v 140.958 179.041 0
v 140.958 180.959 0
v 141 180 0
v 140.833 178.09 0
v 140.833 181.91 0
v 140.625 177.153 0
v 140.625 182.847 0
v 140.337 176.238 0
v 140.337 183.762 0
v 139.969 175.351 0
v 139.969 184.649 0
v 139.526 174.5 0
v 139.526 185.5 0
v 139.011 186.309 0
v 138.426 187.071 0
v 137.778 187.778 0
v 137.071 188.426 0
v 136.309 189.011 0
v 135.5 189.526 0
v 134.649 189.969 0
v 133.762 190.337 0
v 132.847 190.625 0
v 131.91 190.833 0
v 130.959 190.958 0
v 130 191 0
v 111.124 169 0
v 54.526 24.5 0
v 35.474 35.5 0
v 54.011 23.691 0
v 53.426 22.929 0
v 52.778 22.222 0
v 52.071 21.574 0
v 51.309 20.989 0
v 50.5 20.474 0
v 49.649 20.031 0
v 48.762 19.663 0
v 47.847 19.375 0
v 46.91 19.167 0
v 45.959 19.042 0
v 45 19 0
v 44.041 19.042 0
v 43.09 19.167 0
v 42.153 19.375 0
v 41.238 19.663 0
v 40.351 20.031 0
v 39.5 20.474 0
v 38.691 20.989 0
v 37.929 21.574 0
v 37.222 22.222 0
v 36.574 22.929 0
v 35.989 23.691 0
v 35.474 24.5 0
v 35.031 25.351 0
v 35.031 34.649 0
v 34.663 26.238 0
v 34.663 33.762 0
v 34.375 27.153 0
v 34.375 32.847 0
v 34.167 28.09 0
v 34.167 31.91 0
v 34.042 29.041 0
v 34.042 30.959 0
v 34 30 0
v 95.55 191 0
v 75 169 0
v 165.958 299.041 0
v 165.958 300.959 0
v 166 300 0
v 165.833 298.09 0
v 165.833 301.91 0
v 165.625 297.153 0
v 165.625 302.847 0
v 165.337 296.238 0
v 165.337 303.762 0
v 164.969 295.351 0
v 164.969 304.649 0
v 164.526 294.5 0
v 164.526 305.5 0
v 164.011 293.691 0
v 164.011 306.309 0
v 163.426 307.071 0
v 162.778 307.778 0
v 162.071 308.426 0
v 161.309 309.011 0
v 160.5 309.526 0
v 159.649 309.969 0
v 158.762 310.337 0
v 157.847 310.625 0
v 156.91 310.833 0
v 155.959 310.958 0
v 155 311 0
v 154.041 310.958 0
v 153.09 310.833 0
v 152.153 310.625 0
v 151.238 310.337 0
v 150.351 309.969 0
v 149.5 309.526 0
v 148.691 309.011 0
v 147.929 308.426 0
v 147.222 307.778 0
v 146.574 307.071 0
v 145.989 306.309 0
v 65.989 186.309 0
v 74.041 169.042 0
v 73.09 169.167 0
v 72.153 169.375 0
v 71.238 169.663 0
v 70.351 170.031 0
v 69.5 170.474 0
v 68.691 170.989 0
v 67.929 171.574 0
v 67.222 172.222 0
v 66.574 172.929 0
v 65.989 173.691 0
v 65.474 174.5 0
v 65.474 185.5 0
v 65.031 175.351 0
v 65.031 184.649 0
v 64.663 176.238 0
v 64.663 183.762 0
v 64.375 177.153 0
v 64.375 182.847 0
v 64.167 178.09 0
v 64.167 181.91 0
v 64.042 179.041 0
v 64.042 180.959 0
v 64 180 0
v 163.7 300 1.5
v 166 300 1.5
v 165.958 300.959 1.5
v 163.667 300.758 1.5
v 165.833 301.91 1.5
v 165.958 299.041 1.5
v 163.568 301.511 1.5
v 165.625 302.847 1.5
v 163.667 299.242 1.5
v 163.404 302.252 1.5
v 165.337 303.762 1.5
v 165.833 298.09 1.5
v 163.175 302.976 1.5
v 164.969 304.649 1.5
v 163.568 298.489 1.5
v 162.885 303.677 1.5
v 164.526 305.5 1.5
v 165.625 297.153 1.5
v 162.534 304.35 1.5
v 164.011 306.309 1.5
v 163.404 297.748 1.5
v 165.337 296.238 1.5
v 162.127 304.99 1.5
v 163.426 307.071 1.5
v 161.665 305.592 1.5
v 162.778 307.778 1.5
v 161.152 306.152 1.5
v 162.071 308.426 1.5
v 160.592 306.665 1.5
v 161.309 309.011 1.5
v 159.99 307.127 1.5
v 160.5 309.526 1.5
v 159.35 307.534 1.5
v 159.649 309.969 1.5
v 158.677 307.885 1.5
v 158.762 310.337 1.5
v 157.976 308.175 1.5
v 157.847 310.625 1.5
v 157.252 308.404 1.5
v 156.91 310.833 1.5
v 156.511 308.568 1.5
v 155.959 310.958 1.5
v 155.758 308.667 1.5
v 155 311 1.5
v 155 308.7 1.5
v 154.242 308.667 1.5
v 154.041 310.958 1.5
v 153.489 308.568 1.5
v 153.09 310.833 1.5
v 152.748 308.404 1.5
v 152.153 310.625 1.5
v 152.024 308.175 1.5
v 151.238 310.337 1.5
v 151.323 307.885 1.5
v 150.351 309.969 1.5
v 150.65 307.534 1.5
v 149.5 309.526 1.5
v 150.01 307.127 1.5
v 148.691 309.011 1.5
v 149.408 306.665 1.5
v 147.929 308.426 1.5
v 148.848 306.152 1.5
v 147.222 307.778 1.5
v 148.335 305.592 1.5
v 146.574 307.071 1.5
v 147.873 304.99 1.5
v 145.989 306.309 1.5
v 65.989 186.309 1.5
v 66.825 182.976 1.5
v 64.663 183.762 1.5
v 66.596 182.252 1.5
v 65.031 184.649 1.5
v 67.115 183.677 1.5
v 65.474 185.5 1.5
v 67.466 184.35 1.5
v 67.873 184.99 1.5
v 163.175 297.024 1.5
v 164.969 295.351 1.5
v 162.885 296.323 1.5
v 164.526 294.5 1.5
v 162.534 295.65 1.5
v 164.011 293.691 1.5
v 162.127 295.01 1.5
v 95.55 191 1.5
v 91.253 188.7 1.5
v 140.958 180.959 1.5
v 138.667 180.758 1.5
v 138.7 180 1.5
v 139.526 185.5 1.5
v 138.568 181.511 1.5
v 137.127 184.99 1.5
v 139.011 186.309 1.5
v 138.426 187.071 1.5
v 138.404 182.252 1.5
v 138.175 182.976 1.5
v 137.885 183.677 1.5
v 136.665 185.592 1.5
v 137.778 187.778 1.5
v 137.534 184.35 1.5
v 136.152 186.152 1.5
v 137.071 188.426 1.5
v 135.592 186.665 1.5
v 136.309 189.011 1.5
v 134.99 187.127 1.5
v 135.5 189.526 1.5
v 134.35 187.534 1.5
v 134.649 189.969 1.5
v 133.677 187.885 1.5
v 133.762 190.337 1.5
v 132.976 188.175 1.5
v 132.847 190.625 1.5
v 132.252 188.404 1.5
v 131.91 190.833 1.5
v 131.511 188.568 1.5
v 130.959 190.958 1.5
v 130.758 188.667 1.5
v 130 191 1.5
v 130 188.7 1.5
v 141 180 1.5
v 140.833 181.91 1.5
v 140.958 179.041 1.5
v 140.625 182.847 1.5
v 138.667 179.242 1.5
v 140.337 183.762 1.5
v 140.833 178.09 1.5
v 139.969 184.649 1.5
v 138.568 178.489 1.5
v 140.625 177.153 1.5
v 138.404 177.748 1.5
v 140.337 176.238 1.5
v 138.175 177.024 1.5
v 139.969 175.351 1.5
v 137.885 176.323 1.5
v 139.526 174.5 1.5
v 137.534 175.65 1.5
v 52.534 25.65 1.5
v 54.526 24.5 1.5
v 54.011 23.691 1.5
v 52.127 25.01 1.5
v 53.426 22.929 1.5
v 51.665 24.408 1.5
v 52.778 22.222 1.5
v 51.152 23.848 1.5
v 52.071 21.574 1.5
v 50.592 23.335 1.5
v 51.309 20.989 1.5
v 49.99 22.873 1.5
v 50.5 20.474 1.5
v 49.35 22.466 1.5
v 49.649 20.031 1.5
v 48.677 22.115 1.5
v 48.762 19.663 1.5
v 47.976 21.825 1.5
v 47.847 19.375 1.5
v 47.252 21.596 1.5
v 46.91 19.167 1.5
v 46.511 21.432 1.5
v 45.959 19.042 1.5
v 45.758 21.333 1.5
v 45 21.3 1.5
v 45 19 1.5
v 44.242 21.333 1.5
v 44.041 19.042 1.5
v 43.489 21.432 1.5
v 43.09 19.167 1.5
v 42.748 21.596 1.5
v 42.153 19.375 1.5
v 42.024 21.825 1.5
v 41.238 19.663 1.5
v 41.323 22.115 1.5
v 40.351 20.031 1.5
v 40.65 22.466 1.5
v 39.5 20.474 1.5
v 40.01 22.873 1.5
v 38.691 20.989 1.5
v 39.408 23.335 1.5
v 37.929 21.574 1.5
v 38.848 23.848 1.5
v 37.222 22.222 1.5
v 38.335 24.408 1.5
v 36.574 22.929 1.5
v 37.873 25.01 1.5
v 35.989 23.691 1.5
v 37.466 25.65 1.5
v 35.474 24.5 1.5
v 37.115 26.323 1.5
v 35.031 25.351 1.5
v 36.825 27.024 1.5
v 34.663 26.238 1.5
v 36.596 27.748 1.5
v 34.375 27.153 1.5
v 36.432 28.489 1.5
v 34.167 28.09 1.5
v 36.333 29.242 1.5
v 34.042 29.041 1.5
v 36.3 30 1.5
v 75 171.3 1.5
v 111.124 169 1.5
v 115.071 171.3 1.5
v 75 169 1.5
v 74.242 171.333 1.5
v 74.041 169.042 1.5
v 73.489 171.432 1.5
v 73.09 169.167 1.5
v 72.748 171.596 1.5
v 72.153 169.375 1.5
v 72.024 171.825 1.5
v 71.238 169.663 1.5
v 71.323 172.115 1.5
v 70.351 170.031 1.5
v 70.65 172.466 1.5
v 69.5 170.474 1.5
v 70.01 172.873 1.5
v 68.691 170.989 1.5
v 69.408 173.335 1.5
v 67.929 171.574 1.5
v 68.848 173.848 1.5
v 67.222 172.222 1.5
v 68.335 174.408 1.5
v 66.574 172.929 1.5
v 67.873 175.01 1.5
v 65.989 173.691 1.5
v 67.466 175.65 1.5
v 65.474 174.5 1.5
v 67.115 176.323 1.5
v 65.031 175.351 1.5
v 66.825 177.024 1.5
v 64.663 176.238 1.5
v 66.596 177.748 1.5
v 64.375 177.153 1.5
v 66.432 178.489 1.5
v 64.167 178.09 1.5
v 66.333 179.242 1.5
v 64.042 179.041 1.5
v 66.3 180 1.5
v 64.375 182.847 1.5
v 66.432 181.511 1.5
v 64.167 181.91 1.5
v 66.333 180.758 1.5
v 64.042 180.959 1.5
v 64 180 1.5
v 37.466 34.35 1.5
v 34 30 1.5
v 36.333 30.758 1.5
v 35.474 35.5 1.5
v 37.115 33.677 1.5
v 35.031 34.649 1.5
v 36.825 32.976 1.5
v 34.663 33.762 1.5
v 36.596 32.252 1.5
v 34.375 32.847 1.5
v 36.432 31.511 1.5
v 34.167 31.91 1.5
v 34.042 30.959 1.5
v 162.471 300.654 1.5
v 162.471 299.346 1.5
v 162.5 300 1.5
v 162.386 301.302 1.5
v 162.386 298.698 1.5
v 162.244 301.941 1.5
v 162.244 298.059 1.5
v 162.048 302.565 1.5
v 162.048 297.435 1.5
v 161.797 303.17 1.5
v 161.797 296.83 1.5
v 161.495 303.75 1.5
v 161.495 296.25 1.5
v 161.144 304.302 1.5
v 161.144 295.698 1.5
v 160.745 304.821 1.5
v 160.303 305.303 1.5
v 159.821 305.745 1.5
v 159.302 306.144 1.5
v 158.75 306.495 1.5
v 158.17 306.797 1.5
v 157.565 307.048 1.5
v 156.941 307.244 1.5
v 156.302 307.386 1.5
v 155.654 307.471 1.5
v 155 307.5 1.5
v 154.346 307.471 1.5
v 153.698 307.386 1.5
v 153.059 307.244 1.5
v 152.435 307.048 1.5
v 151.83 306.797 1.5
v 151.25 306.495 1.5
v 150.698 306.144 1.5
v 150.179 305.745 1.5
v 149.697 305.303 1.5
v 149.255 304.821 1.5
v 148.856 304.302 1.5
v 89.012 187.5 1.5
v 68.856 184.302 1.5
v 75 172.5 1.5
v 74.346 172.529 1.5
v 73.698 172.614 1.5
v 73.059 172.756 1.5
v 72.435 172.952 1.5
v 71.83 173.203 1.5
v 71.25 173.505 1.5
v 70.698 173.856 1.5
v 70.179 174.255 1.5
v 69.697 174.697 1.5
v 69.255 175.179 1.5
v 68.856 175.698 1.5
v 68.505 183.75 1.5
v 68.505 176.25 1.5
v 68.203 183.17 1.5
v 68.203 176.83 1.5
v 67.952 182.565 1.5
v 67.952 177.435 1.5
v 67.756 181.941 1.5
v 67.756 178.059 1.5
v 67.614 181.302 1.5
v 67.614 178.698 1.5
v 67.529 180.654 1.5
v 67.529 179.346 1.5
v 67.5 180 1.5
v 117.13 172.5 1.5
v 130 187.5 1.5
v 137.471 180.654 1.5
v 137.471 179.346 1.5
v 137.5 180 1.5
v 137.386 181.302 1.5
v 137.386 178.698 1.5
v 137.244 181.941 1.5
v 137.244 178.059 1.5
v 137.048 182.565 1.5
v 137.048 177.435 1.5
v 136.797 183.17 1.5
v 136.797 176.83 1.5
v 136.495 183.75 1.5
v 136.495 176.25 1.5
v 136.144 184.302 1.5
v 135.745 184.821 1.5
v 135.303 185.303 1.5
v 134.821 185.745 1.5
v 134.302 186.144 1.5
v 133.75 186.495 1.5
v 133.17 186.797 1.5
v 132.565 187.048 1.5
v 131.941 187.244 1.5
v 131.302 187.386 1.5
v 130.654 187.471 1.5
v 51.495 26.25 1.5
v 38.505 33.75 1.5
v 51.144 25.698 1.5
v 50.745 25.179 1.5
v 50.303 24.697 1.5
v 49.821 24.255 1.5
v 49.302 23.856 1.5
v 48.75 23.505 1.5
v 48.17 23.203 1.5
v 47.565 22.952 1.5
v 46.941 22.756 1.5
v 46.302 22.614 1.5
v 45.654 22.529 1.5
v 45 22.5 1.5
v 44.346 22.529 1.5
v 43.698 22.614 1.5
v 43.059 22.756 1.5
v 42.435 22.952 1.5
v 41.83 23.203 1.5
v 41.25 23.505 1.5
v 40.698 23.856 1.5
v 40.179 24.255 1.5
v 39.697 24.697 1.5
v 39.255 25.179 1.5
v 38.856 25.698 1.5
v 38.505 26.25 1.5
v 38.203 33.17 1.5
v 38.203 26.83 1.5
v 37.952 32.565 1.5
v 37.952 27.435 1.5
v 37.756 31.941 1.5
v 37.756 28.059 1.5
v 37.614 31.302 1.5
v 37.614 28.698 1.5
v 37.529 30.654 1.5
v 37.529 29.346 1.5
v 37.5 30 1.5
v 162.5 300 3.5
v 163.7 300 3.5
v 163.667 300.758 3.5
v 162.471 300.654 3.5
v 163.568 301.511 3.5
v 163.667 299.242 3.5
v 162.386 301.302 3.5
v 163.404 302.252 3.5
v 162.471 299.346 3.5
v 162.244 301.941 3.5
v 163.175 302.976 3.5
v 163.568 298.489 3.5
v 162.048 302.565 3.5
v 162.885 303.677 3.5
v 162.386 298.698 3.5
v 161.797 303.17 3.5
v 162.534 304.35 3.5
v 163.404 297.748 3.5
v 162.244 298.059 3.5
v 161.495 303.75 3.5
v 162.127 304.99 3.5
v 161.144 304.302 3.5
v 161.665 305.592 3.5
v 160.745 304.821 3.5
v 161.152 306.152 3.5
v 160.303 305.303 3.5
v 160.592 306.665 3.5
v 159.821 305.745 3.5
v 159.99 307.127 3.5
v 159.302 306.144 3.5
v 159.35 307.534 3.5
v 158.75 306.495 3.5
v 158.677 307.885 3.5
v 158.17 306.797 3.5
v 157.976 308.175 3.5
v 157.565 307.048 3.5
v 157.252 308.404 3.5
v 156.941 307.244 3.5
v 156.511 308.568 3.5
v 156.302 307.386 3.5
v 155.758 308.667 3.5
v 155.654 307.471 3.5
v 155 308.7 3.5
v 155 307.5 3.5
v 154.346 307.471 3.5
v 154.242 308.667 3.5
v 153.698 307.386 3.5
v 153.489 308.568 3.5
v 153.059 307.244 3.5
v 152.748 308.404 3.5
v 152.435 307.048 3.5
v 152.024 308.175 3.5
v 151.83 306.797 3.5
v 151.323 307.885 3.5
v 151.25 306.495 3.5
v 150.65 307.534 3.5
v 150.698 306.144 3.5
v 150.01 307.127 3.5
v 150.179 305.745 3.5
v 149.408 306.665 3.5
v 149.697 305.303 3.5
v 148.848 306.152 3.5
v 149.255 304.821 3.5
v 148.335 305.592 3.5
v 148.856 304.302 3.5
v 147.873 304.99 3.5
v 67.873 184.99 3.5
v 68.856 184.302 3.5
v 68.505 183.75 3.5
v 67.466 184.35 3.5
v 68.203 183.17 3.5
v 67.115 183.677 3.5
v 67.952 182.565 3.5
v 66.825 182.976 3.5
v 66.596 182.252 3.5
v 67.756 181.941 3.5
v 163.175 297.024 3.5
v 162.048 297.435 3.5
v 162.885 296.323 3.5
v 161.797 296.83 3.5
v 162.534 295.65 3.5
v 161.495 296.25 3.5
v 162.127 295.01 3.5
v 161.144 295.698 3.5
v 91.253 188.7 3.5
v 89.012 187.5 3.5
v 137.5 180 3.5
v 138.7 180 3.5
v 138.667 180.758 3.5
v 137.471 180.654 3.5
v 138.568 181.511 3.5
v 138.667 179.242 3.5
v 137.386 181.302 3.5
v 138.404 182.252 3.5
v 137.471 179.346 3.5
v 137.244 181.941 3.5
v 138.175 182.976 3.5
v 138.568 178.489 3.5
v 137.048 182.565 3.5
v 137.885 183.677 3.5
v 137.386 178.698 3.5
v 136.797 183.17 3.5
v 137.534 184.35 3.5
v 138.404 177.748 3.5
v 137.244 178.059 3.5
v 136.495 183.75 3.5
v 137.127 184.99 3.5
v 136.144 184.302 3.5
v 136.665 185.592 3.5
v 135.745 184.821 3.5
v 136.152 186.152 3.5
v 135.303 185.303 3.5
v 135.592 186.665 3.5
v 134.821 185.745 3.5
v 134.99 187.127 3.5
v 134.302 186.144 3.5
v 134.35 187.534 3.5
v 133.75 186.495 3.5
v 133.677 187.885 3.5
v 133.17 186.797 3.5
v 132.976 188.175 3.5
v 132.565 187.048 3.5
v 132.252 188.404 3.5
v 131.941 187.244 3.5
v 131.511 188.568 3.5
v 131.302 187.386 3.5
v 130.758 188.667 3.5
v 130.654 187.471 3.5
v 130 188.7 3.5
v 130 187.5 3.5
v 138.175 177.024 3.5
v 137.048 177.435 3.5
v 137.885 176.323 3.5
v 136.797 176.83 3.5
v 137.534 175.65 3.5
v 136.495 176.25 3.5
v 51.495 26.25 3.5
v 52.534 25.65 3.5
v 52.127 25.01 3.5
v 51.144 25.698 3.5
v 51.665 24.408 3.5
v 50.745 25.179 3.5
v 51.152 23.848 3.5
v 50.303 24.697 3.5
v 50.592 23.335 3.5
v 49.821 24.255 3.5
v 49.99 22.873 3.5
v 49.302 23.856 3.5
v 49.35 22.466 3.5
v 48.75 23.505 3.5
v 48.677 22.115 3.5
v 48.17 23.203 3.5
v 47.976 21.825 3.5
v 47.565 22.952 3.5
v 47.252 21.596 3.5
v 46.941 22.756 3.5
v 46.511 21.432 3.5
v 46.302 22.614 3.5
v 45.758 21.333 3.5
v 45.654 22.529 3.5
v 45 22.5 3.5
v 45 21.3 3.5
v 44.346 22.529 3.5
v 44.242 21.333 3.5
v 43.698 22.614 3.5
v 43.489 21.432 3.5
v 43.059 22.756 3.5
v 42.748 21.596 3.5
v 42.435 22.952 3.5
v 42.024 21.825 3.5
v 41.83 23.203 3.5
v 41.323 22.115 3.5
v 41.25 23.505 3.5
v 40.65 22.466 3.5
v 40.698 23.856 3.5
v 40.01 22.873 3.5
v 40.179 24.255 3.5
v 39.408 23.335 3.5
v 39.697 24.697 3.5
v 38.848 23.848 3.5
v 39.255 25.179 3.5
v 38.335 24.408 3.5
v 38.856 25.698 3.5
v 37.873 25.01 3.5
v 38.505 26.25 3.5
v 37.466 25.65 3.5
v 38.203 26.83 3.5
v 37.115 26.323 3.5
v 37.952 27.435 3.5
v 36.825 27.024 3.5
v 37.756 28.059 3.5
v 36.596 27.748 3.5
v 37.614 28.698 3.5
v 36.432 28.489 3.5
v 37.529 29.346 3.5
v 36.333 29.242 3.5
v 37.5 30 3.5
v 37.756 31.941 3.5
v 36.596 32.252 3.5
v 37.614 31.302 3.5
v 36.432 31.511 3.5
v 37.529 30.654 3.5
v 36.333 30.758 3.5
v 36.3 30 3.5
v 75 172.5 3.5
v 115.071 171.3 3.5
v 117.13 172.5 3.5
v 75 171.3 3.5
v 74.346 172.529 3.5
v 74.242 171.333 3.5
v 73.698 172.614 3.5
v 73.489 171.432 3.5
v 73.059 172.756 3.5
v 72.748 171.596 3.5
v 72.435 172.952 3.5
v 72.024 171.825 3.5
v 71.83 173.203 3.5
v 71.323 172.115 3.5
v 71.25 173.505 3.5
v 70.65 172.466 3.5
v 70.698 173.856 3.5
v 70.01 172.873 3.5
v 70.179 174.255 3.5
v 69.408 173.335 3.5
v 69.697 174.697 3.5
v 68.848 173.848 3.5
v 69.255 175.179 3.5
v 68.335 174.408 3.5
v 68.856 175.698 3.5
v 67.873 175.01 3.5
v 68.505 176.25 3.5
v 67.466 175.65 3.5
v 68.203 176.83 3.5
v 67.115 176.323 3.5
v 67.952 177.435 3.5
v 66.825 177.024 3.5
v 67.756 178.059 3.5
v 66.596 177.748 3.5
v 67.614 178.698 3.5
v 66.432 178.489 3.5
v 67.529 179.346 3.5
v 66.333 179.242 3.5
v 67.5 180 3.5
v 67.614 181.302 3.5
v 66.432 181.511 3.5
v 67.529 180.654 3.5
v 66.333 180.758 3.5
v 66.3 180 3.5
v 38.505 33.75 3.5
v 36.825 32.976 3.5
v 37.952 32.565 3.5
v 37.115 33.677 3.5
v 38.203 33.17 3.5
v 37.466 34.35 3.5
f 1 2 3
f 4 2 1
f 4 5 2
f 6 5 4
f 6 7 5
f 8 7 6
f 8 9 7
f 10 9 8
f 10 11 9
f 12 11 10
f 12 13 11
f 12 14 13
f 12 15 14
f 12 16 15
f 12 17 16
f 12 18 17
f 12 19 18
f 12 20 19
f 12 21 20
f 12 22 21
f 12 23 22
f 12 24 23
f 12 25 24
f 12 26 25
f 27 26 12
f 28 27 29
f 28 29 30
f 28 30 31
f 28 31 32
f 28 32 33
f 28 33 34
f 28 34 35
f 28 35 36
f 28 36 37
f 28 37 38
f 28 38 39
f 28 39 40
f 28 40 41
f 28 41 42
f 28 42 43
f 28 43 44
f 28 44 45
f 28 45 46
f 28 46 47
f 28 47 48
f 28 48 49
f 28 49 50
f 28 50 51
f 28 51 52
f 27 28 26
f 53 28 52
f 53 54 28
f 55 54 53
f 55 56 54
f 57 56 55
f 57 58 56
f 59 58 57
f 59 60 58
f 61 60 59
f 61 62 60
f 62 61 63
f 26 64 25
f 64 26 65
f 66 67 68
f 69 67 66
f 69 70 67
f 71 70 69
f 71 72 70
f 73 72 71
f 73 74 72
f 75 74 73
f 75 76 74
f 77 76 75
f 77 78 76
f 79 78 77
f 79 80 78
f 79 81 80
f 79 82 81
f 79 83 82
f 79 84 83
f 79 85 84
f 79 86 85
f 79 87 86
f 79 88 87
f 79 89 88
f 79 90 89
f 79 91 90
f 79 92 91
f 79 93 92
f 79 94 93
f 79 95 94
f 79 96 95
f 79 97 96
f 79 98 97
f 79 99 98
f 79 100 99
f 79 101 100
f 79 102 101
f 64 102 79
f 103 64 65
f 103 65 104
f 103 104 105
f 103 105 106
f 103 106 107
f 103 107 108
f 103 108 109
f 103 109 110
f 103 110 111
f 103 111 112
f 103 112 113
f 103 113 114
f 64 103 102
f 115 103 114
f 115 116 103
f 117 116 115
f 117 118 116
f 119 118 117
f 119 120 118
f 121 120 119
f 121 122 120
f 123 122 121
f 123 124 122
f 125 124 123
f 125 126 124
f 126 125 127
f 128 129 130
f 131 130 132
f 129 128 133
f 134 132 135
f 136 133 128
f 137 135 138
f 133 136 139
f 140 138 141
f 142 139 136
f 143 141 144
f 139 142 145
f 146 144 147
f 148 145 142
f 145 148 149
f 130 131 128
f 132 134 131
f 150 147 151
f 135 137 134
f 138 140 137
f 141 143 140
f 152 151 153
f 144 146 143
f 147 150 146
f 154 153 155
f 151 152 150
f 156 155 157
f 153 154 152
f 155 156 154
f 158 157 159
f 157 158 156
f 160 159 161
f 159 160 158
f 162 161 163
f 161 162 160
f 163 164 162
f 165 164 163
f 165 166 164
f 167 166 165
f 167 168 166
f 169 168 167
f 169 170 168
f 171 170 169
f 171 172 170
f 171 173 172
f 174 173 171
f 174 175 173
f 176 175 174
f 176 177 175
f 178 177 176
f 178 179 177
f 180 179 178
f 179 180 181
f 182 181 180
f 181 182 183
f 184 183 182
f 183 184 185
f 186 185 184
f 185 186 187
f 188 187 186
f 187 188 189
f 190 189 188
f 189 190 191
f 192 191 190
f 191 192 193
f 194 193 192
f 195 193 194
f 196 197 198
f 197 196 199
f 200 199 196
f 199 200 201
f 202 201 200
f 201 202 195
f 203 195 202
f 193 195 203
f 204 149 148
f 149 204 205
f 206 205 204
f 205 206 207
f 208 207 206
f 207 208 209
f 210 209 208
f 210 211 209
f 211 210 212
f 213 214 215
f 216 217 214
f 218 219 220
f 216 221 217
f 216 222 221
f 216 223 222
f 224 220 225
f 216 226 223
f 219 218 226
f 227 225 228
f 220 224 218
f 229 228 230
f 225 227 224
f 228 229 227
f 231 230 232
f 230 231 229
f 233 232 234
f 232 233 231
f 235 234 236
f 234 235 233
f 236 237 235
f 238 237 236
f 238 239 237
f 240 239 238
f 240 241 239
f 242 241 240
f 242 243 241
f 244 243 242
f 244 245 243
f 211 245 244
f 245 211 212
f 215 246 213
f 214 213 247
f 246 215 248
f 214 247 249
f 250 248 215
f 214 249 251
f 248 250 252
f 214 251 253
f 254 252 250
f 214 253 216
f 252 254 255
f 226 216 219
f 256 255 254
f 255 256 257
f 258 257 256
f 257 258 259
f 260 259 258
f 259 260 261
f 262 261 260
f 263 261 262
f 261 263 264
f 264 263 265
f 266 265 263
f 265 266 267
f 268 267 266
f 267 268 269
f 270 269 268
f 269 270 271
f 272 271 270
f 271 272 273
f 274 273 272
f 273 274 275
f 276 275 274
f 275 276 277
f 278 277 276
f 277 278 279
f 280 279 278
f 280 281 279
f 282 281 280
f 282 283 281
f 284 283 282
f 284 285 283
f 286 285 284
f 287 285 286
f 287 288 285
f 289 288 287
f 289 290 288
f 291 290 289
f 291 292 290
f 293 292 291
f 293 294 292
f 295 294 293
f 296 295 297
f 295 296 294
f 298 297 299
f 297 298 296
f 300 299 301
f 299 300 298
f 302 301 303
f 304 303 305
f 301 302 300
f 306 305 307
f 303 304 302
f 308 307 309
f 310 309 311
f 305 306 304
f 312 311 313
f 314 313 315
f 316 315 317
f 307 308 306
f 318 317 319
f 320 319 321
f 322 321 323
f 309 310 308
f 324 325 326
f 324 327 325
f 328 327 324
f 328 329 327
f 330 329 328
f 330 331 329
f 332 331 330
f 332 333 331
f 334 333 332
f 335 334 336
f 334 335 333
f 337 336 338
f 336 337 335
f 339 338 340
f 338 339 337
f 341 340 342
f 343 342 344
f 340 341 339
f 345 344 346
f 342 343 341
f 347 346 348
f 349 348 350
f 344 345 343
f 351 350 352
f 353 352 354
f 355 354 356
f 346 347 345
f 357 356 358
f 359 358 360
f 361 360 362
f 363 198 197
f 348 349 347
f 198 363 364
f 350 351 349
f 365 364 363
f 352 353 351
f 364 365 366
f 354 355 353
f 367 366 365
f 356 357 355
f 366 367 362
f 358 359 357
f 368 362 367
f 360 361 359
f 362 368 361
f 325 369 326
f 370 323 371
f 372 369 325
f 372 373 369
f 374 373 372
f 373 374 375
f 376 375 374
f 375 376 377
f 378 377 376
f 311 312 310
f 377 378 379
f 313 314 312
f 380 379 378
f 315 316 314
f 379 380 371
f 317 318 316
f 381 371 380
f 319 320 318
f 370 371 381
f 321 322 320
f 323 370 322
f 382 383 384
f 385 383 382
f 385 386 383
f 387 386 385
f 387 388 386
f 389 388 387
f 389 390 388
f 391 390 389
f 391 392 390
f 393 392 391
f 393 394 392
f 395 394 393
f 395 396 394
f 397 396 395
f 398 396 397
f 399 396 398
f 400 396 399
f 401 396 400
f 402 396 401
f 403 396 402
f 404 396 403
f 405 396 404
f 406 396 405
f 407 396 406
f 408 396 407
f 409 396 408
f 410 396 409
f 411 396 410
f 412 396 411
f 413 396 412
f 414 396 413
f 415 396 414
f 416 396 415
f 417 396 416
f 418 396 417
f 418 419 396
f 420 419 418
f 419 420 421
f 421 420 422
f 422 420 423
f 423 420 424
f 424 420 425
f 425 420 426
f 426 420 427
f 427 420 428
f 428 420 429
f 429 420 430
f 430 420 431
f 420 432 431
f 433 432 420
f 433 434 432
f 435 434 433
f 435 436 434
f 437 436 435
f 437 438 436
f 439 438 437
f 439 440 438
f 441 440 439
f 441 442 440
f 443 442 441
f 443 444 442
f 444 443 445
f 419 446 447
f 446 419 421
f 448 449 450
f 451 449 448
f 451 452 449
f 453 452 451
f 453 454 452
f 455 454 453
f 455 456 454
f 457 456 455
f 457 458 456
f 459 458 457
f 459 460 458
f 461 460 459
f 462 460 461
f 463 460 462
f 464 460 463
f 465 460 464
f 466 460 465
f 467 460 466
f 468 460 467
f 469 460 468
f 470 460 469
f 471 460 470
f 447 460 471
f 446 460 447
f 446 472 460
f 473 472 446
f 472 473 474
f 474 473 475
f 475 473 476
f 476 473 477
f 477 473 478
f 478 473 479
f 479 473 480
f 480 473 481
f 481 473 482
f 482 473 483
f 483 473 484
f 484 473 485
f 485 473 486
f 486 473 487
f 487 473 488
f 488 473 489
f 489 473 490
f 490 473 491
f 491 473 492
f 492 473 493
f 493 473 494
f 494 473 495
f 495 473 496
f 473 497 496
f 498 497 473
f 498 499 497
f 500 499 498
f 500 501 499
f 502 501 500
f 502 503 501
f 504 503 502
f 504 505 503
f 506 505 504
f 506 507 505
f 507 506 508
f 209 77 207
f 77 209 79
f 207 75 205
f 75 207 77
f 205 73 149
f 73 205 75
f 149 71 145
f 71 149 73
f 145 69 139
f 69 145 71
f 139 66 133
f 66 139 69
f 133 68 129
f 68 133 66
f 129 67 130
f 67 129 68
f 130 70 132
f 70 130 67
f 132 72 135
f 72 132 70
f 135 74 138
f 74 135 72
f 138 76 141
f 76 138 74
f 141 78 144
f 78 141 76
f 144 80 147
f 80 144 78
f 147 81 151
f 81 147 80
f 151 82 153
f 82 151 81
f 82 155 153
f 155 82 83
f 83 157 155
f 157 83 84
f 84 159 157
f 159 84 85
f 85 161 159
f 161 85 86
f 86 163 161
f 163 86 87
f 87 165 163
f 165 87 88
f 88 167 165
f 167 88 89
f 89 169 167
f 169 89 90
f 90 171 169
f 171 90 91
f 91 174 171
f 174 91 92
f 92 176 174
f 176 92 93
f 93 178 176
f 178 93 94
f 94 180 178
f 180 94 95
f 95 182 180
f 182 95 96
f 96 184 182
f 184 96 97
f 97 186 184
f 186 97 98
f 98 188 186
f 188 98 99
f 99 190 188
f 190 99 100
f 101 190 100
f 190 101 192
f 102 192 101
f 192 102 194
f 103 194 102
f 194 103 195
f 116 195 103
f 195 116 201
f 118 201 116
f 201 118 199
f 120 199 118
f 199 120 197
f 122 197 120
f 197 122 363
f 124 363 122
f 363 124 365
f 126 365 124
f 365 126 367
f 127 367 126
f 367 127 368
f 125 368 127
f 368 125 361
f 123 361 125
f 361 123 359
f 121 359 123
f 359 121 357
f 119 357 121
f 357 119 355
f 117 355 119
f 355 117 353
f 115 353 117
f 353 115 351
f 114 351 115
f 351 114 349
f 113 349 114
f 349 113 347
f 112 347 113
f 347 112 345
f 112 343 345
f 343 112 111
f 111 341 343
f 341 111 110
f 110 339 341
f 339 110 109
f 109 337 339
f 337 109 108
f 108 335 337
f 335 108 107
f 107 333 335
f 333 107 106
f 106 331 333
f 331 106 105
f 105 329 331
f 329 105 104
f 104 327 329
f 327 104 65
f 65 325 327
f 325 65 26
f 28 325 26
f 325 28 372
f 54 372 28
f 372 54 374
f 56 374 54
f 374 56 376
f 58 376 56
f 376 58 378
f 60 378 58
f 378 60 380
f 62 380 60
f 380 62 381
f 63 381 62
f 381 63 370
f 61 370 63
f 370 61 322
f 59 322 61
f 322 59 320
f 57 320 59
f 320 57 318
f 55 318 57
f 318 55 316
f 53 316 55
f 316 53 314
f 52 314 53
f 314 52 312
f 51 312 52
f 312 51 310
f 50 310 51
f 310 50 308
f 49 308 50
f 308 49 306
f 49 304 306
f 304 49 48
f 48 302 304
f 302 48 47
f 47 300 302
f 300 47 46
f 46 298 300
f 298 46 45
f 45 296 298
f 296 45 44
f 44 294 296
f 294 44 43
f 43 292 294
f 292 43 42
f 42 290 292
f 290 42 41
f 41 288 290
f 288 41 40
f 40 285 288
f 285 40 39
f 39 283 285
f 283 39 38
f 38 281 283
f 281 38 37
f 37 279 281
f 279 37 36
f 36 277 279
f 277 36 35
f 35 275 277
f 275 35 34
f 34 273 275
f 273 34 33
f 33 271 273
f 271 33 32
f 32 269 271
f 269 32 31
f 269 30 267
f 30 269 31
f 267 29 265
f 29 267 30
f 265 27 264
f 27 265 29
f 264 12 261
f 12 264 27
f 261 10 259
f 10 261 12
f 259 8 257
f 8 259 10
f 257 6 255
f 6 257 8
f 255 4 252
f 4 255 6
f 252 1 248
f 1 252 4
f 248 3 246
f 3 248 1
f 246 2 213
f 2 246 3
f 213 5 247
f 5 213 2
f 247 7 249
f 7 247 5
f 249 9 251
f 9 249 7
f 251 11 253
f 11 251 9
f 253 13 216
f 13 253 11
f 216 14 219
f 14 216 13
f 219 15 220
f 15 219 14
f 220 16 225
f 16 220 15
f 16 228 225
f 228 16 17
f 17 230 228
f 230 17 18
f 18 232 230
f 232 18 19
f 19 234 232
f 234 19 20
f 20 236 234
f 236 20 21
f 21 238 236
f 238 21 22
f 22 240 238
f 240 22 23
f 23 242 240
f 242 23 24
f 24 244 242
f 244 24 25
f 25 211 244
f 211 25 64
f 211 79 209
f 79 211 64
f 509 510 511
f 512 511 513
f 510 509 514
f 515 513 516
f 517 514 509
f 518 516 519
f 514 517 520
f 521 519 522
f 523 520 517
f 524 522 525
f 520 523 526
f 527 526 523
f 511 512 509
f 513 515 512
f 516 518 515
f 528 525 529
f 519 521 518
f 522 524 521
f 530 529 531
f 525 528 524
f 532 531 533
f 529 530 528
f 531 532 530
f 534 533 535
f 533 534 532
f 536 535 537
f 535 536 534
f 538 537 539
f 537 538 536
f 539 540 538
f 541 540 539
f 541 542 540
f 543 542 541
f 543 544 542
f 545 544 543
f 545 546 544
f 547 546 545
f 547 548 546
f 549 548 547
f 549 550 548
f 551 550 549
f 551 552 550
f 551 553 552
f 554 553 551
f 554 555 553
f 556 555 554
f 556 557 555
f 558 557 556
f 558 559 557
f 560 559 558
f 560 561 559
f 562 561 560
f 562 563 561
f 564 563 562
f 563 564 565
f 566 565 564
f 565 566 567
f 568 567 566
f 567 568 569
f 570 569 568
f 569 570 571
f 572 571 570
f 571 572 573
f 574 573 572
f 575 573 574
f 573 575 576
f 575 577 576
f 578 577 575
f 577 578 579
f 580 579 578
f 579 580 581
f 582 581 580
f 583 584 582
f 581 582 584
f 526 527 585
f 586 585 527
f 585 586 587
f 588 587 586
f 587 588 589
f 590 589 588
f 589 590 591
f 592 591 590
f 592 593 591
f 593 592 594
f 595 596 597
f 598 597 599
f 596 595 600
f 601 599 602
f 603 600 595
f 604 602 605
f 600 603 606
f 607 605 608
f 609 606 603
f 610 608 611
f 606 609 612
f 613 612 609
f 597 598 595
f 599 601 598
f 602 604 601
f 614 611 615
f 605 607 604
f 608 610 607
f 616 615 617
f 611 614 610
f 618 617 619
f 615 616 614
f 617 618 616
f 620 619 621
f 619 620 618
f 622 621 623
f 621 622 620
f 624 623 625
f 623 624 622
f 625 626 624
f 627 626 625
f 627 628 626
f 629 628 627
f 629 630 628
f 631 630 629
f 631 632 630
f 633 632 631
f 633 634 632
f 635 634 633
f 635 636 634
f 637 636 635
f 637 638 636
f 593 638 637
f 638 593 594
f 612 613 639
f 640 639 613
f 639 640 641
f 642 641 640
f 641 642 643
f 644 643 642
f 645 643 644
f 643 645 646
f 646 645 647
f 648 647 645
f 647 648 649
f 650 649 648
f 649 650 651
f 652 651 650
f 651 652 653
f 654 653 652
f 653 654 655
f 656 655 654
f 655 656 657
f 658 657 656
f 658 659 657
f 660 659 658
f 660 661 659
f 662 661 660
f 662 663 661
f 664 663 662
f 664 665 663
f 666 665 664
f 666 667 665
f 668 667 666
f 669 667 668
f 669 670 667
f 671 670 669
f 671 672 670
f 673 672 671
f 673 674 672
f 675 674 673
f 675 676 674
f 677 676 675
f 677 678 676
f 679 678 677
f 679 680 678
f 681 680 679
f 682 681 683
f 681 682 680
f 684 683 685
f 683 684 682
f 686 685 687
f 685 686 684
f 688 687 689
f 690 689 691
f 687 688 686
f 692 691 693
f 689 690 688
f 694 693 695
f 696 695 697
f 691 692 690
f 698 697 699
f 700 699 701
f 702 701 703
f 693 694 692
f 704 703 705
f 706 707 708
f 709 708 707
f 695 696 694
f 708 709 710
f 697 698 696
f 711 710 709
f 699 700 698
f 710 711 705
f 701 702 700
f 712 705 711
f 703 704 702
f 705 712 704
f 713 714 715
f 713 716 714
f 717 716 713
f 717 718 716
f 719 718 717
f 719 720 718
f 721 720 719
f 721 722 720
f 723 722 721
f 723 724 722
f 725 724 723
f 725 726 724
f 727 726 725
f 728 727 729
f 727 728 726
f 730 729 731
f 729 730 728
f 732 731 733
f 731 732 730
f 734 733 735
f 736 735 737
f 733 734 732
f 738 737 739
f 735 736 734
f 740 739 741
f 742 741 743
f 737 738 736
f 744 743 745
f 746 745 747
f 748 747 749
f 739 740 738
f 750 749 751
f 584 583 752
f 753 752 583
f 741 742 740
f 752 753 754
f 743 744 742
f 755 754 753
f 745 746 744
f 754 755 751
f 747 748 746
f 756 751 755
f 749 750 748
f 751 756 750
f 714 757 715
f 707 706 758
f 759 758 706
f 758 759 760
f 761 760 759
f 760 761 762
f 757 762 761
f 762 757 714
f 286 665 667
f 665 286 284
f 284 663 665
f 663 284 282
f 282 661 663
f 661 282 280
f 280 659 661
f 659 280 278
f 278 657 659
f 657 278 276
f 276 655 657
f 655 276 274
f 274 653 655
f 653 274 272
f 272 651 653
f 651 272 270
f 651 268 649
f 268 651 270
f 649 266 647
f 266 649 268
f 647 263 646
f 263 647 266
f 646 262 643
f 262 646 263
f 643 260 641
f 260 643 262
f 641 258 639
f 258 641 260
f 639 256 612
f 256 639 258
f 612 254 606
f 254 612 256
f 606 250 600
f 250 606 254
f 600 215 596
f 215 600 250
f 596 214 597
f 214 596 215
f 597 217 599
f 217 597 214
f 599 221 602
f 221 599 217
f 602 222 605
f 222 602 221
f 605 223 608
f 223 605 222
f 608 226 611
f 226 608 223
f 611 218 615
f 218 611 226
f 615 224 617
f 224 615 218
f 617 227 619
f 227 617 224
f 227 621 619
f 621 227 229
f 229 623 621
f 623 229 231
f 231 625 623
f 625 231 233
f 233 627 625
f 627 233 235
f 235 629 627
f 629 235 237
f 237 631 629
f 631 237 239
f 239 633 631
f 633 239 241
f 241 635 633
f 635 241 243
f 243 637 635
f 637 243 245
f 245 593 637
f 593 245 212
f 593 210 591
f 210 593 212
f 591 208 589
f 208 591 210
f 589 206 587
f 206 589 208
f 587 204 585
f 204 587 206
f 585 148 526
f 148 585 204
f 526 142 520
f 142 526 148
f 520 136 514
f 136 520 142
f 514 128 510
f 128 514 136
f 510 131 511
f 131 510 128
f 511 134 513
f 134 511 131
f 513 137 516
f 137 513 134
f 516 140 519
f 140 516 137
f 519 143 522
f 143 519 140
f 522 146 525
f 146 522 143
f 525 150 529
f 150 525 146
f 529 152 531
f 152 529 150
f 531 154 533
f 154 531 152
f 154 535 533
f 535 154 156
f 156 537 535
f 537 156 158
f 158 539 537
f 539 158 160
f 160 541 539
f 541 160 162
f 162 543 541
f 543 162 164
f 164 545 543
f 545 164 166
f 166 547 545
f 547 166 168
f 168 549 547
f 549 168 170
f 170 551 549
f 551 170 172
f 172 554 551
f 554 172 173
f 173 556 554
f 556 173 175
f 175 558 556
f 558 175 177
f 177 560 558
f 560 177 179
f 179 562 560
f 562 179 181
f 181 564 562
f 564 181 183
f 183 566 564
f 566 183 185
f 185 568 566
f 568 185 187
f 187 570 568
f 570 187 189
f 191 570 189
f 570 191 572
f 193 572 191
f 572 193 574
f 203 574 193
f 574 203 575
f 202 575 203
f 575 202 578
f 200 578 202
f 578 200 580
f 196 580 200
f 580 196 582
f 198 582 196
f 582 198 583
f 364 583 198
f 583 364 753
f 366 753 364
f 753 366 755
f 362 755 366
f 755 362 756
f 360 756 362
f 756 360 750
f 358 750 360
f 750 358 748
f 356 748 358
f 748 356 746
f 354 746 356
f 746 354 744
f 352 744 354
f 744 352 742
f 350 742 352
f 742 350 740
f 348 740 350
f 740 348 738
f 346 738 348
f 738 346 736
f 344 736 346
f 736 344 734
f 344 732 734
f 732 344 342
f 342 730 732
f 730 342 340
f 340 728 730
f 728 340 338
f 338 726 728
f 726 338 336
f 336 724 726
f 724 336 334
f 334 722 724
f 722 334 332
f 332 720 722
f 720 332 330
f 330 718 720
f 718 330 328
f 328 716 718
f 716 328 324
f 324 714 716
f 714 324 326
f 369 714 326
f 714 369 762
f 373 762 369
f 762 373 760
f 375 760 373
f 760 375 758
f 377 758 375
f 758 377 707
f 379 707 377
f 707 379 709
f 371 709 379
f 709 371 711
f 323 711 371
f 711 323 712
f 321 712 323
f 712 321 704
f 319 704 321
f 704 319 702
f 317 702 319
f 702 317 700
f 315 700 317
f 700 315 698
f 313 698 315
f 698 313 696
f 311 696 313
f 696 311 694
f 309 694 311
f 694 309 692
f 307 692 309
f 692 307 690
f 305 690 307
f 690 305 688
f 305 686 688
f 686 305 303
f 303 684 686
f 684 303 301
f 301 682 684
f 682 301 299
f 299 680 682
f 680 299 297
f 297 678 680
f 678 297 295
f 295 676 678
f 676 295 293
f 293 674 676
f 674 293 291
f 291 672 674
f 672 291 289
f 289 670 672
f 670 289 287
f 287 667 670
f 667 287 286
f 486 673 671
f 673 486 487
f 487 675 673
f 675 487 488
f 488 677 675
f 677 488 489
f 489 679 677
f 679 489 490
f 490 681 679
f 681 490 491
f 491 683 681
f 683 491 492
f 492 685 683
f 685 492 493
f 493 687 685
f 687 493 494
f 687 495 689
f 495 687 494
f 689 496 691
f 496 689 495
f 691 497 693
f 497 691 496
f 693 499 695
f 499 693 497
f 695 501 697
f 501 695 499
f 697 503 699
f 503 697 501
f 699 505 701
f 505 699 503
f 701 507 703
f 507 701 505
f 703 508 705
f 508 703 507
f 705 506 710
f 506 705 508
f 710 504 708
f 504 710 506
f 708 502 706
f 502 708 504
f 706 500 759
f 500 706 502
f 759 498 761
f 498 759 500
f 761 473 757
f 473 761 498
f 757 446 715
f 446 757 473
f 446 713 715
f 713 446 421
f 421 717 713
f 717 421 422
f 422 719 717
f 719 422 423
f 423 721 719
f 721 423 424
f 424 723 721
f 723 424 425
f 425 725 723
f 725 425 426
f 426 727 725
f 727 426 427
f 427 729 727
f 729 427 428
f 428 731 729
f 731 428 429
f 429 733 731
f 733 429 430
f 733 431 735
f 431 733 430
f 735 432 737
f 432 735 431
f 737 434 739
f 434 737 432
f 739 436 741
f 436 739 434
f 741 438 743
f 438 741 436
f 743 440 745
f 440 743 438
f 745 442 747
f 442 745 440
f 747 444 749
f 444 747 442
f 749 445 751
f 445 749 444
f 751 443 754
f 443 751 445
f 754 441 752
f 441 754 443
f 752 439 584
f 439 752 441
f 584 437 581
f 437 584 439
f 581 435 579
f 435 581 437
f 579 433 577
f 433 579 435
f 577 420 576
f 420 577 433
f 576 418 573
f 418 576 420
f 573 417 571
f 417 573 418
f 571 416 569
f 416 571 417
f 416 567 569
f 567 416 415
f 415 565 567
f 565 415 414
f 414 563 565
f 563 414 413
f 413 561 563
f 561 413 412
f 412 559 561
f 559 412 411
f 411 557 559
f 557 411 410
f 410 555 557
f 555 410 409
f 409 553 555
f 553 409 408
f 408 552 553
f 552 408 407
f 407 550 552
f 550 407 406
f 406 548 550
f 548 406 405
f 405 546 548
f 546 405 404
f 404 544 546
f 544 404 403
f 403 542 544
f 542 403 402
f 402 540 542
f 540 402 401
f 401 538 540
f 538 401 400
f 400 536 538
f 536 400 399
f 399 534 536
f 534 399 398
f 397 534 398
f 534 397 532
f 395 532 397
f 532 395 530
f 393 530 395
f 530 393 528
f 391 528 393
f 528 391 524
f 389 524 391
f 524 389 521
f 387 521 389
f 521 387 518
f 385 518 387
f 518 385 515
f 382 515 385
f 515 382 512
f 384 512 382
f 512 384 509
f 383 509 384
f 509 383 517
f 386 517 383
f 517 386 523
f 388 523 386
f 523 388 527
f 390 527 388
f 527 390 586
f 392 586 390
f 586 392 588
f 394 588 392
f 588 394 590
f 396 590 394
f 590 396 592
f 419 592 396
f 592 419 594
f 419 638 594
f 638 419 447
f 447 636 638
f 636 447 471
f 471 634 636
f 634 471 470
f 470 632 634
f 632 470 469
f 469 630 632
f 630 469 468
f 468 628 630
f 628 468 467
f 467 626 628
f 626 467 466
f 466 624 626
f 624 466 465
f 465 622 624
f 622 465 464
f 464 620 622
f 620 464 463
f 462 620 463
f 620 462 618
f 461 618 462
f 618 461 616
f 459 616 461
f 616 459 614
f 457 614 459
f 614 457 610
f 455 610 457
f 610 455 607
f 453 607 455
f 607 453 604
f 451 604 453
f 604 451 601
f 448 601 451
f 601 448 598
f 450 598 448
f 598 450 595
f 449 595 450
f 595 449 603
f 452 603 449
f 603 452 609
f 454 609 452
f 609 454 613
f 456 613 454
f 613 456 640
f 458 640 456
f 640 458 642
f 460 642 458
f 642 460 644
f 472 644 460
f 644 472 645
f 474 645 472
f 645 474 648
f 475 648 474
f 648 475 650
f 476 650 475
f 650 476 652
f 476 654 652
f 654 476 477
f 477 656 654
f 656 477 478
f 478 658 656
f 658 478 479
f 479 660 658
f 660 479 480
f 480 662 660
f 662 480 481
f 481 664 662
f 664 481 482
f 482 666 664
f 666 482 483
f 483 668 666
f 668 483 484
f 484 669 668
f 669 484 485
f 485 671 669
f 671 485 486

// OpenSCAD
// file: ../bolt.scad
bolt_pts  = [[155.0,300.0], [75.0,180.0], [130.0,180.0], [45.0,30.0]];
pixel_pts = [[155.0,300.0], [142.8,281.7], [130.6,263.3], [118.3,245.0], [106.1,226.7], [93.9,208.3], [81.7,190.0], [96.7,180.0], [118.8,180.0], [119.7,161.9], [108.9,142.8], [98.1,123.6], [87.2,104.5], [76.4,85.3], [65.5,66.2], [54.7,47.1], [45.0,30.0]];

// ===== CHARGE lightning-bolt test piece — option C (~18mm channel) =====
bolt_inner     = 18;                       // channel interior (collar O16 fits)
bolt_wall      = 2;                         // wall thickness
bolt_outer     = bolt_inner + 2*bolt_wall; // 22mm outer stroke
bolt_gap       = 15;                       // LED-tip -> lens
bolt_ch_h      = dome_clear + bolt_gap;    // wall height above plate
bolt_lens_t    = 1.5;                       // lens face thickness
bolt_lip_h     = 2;                         // lens locating lip depth
bolt_lip_clear = 0.6;                       // lip clearance into channel
bolt_lip_t     = 1.2;                       // lip wall thickness

module bolt_stroke(w) {
    for (i = [0 : len(bolt_pts) - 2])
        hull() {
            translate(bolt_pts[i])     circle(d = w);
            translate(bolt_pts[i + 1]) circle(d = w);
        }
}

module bolt_shell() {
    difference() {
        union() {
            linear_extrude(plate_t) bolt_stroke(bolt_outer);
            translate([0, 0, plate_t]) linear_extrude(bolt_ch_h)
                difference() { bolt_stroke(bolt_outer); bolt_stroke(bolt_inner); }
        }
        for (p = pixel_pts)
            translate([p[0], p[1], -0.1]) cylinder(h = plate_t + 0.2, d = pixel_through);
    }
    for (p = pixel_pts) place_collar(p[0], p[1]);
}

module bolt_lens() {
    union() {
        linear_extrude(bolt_lens_t) bolt_stroke(bolt_outer);
        translate([0, 0, bolt_lens_t]) linear_extrude(bolt_lip_h)
            difference() {
                bolt_stroke(bolt_inner - bolt_lip_clear);
                bolt_stroke(bolt_inner - bolt_lip_clear - 2 * bolt_lip_t);
            }
    }
}
// file: ../collar.scad
// Calibrated press-fit collar, merged into the rear wall at each pixel.
// The STL is symmetric top/bottom (retention lip at mid-height), so insertion
// direction does not matter. Native STL sits X-centered at collar_cx, Z 0..collar_h.

module collar_solid() {
    translate([-collar_cx, 0, 0])
        import(collar_stl, convexity = 6);
}

module place_collar(x, y) {
    translate([x, y, 0]) collar_solid();
}
// file: ../config.scad
// ===== CHARGE LED sign — global config =====
// Edit this file; then run ./build.sh to regenerate every STL.

$fn = 72;

// ---- calibrated collar (press-fit for 12mm bullet pixel) ----
collar_stl    = "../../assets/bullet-collar.stl"; // path resolved from src/parts/ entry files
collar_h      = 2.0;     // Z span of the collar STL
collar_od     = 16.0;    // collar outer diameter
collar_cx     = 43.0;    // STL native X center (Y center is 0)
pixel_through = 12.3;    // clearance hole through the plate (just over bore Ø12.19)
dome_clear    = 4.0;     // dome protrusion above plate front. Spec: 5.5mm dome-tip-to-flange,
                         // flange seats on plate back, minus 2mm plate ~= 3.5-4mm. Seat a real
                         // pixel and measure to lock it in.

// ---- shell ----
plate_t    = 2.0;        // rear plate thickness (== collar_h, so the collar sits flush)
wall_t     = 2.5;        // chimney wall thickness
cell_inner = 30;         // square interior of each test cell (the press-fit opening)

// ---- diffuser panels (flat, drop-in — kept for the final glued option) ----
panel_press_clear = 0.25; // panel is this much SMALLER than the opening (total) -> friction fit
panel_thicks      = [1, 2, 3];

// ---- diffuser CAP (slides over an ISOLATED chimney; not used on touching rows) ----
cap_fit_clear = 0.4;   // skirt-inner minus chimney-outer (total); bigger = looser slide
cap_skirt_t   = 1.6;   // skirt wall thickness
cap_skirt_h   = 7;     // how far the skirt grips down over the chimney

// ---- diffuser LID = flanged plug (plug locates in the opening, flange catches on the rim) ----
lid_flange_cover = wall_t;  // flange overhang per side ~= wall width (rests on rim, can't fall in)
lid_flange_gap   = 0.3;     // shrink the flange a hair so neighbour lids don't clash
lid_plug_h       = 4;       // how far the plug drops into the opening (0 = plain flat tile)
lid_plug_clear   = 0.2;     // plug-outer = opening minus this (total) -> friction fit
                            // (was 0.5/loose; PETG plug in a PLA hole grips well at 0.2)
lid_plug_wall    = 1.5;     // plug-frame wall thickness

// ---- coupon depth ladder ----
led_gaps = [10, 15, 20]; // clear LED-tip -> diffuser distance, per cell (mm)
                         // (was [20,35,50] — 35/50 went too dim/washed; 20 is the new max)

// ---- collar v2: original bore + lip, plus a 45-deg lead-in chamfer ----
bore_face_r   = 6.10;    // collar bore radius at each face (~Ø12.2)
chamfer_depth = 0.5;     // axial depth of the 45-deg lead-in at each face
mouth_r       = bore_face_r + chamfer_depth;  // chamfer mouth radius (~Ø13.2)

// ---- collar A/B test harness ----
harness_w     = 52;      // tile width
harness_d     = 30;      // tile depth
harness_t     = plate_t; // match the real wall thickness for a faithful fit test
harness_pitch = 24;      // spacing between the two hole centers

// ---- derived ----
cell_pitch = cell_inner + 2 * wall_t;      // outer cell footprint (35)
n_cells    = len(led_gaps);
plate_w    = n_cells * cell_pitch;
plate_d    = cell_pitch;
panel_side = cell_inner - panel_press_clear;
function cell_x(i)     = i * cell_pitch + cell_pitch / 2;   // column center (distance)
function cell_y(j)     = j * cell_pitch + cell_pitch / 2;   // row center (for grid coupons)
function chimney_H(i)  = plate_t + dome_clear + led_gaps[i];
// main file
// Build target: lightning-bolt lens (bolt-shaped diffuser + locating lip).
// Print face-down (flange on bed), lip up; flip in use. Try it in white.
include <../config.scad>
include <../collar.scad>
include <../bolt.scad>
bolt_lens();
